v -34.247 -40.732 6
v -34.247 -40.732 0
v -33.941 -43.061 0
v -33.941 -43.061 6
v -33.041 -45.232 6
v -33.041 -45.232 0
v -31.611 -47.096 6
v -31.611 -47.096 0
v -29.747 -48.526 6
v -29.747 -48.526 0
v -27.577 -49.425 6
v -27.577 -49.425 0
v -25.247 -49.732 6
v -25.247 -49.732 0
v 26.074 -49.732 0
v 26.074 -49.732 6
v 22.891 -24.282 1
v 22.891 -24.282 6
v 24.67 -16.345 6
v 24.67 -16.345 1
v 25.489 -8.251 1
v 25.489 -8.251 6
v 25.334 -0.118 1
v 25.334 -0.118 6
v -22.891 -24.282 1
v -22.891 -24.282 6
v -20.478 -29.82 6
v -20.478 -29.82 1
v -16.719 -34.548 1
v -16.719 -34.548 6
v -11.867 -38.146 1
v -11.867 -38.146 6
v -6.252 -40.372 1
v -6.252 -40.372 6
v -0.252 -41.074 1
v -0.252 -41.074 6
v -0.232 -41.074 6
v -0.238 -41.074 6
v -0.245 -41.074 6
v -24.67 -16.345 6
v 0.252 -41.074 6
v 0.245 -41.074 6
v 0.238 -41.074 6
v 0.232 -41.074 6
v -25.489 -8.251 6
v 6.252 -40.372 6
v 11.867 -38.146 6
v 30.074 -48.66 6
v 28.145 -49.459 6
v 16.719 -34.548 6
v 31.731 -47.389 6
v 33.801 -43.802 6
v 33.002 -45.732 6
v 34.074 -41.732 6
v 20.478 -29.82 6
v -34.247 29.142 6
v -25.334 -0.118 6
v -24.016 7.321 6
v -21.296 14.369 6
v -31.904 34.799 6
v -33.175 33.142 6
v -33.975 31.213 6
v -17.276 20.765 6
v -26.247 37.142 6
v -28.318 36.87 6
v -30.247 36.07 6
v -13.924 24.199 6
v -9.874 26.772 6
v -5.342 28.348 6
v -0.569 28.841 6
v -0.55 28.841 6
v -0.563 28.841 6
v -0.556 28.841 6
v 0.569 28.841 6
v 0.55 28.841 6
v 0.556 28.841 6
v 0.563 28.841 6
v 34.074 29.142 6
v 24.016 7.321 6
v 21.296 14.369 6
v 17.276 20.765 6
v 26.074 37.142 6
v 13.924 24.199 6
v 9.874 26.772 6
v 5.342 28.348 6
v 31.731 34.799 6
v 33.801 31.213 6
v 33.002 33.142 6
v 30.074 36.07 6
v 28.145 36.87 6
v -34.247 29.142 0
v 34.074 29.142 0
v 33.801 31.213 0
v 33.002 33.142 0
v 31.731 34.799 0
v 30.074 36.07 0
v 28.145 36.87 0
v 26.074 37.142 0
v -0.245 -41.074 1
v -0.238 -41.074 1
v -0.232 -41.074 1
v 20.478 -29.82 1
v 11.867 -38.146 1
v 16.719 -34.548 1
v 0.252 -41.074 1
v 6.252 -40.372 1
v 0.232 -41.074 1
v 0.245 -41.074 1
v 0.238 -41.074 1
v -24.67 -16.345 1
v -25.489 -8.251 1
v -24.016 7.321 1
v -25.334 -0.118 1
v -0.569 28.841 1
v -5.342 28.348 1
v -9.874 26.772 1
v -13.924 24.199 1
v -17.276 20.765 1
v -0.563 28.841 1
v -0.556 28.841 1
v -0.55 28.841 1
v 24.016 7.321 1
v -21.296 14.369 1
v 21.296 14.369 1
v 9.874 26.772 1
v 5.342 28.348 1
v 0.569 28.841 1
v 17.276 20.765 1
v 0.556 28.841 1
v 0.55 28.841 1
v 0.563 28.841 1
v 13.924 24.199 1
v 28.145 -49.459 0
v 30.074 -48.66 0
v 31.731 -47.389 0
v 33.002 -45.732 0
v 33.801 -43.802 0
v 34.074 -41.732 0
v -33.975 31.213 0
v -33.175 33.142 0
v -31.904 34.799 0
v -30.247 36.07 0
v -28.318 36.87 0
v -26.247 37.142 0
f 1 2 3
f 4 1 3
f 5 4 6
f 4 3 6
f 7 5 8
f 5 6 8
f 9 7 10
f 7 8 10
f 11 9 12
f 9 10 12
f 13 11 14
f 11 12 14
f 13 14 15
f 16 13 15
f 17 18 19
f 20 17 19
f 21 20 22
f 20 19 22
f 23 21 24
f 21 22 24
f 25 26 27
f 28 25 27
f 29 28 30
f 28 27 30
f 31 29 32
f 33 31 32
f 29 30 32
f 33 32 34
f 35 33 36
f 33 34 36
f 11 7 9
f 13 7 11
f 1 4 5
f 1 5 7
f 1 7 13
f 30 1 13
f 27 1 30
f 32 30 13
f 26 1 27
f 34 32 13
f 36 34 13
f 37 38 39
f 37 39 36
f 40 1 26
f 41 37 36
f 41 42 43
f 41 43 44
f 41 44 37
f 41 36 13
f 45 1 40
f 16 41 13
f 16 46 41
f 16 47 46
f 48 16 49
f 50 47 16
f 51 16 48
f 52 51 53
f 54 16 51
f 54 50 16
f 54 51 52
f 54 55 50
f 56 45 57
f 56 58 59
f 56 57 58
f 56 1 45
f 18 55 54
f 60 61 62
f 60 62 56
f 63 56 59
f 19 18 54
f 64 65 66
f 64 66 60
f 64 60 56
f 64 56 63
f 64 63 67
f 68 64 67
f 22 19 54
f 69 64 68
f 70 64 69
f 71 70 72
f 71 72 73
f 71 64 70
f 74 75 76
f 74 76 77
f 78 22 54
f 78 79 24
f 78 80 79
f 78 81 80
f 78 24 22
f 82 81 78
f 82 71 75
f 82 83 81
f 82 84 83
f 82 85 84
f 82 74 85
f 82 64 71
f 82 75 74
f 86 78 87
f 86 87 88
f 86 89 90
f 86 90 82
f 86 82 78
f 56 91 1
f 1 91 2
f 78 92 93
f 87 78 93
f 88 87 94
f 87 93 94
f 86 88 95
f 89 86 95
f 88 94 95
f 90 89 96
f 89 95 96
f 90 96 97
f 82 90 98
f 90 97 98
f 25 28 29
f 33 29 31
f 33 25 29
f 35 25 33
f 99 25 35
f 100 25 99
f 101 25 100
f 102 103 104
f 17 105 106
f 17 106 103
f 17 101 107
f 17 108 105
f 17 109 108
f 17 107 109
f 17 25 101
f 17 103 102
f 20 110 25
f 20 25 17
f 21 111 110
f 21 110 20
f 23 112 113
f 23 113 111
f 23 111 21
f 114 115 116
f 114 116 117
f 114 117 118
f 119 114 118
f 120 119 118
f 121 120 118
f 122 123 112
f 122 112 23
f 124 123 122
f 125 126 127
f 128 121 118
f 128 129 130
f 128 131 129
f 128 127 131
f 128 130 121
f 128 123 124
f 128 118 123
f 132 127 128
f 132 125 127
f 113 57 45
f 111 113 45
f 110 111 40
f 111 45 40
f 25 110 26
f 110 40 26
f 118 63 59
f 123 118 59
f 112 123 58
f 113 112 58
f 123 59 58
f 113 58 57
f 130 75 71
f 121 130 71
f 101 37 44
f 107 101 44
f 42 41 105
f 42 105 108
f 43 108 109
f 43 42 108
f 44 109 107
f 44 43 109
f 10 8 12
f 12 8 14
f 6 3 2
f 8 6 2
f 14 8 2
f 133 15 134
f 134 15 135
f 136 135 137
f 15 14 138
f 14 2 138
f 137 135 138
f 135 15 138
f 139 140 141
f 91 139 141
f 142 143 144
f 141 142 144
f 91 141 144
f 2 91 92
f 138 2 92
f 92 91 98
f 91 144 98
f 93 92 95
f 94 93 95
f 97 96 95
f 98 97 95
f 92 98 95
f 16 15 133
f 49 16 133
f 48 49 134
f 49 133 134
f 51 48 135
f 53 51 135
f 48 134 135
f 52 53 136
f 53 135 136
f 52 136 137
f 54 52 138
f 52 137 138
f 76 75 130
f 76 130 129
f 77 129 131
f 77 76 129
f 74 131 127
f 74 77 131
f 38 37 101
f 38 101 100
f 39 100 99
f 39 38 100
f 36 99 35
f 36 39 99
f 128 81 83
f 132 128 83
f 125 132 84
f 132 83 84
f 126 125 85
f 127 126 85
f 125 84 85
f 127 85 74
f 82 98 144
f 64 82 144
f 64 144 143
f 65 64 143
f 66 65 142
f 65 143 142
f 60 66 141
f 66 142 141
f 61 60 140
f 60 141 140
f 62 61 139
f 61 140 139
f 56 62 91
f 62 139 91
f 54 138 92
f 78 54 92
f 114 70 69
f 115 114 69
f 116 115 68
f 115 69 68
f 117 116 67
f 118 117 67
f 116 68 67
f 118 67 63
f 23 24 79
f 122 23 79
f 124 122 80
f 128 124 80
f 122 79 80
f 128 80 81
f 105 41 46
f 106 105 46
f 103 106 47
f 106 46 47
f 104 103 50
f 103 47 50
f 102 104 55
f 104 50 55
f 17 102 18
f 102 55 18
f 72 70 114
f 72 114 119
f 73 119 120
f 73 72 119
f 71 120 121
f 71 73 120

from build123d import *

# Parameters (mm, degrees)
PAD_DEPTH    = 6
POCKET_DEPTH = 5


with BuildPart() as part:
    # Sketch004 → Pad (new body)
    with BuildSketch(Plane.XY):
        with BuildLine():
            Line((-34.247254, 29.142098), (-34.247254, -40.731934))
            ThreePointArc((-34.247254, -40.731934), (-31.611215, -47.095895), (-25.247254, -49.731934))
            Line((-25.247254, -49.731934), (26.073956, -49.731934))
            ThreePointArc((26.073956, -49.731934), (31.73081, -47.388788), (34.073956, -41.731934))
            Line((34.073956, -41.731934), (34.073956, 29.142098))
            ThreePointArc((34.073956, 29.142098), (31.73081, 34.798952), (26.073956, 37.142098))
            Line((26.073956, 37.142098), (-26.247254, 37.142098))
            ThreePointArc((-26.247254, 37.142098), (-31.904109, 34.798952), (-34.247254, 29.142098))
        make_face()
    extrude(amount=PAD_DEPTH)

    # Sketch → Pocket (cut)
    with BuildSketch(Plane.XY.offset(6)):
        with BuildLine():
            ThreePointArc((0.2524, -41.074003), (14.410312, -36.50526), (22.890576, -24.282125))
            ThreePointArc((22.890576, -24.282125), (25.200826, -12.310293), (25.333783, -0.118314))
            ThreePointArc((25.333783, -0.118314), (22.825754, 10.910473), (17.275703, 20.765487))
            ThreePointArc((17.275703, 20.765487), (9.874199, 26.772272), (0.569118, 28.840892))
            ThreePointArc((0.55, 28.840771), (0.559559, 28.840801), (0.569118, 28.840892))
            Line((0.55, 28.840771), (0, 28.840771))
            Line((-0.55, 28.840771), (0, 28.840771))
            ThreePointArc((-0.569118, 28.840892), (-0.559559, 28.840801), (-0.55, 28.840771))
            ThreePointArc((-0.569118, 28.840892), (-9.874199, 26.772272), (-17.275703, 20.765487))
            ThreePointArc((-17.275703, 20.765487), (-22.825754, 10.910473), (-25.333783, -0.118314))
            ThreePointArc((-25.333783, -0.118314), (-25.200826, -12.310293), (-22.890576, -24.282125))
            ThreePointArc((-22.890576, -24.282125), (-14.410312, -36.50526), (-0.2524, -41.074003))
            ThreePointArc((-0.231547, -41.073858), (-0.241974, -41.073894), (-0.2524, -41.074003))
            Line((-0.231547, -41.073858), (0, -41.073858))
            Line((0.231547, -41.073858), (0, -41.073858))
            ThreePointArc((0.2524, -41.074003), (0.241974, -41.073894), (0.231547, -41.073858))
        make_face()
    extrude(amount=-POCKET_DEPTH, mode=Mode.SUBTRACT)


solid = part.part
